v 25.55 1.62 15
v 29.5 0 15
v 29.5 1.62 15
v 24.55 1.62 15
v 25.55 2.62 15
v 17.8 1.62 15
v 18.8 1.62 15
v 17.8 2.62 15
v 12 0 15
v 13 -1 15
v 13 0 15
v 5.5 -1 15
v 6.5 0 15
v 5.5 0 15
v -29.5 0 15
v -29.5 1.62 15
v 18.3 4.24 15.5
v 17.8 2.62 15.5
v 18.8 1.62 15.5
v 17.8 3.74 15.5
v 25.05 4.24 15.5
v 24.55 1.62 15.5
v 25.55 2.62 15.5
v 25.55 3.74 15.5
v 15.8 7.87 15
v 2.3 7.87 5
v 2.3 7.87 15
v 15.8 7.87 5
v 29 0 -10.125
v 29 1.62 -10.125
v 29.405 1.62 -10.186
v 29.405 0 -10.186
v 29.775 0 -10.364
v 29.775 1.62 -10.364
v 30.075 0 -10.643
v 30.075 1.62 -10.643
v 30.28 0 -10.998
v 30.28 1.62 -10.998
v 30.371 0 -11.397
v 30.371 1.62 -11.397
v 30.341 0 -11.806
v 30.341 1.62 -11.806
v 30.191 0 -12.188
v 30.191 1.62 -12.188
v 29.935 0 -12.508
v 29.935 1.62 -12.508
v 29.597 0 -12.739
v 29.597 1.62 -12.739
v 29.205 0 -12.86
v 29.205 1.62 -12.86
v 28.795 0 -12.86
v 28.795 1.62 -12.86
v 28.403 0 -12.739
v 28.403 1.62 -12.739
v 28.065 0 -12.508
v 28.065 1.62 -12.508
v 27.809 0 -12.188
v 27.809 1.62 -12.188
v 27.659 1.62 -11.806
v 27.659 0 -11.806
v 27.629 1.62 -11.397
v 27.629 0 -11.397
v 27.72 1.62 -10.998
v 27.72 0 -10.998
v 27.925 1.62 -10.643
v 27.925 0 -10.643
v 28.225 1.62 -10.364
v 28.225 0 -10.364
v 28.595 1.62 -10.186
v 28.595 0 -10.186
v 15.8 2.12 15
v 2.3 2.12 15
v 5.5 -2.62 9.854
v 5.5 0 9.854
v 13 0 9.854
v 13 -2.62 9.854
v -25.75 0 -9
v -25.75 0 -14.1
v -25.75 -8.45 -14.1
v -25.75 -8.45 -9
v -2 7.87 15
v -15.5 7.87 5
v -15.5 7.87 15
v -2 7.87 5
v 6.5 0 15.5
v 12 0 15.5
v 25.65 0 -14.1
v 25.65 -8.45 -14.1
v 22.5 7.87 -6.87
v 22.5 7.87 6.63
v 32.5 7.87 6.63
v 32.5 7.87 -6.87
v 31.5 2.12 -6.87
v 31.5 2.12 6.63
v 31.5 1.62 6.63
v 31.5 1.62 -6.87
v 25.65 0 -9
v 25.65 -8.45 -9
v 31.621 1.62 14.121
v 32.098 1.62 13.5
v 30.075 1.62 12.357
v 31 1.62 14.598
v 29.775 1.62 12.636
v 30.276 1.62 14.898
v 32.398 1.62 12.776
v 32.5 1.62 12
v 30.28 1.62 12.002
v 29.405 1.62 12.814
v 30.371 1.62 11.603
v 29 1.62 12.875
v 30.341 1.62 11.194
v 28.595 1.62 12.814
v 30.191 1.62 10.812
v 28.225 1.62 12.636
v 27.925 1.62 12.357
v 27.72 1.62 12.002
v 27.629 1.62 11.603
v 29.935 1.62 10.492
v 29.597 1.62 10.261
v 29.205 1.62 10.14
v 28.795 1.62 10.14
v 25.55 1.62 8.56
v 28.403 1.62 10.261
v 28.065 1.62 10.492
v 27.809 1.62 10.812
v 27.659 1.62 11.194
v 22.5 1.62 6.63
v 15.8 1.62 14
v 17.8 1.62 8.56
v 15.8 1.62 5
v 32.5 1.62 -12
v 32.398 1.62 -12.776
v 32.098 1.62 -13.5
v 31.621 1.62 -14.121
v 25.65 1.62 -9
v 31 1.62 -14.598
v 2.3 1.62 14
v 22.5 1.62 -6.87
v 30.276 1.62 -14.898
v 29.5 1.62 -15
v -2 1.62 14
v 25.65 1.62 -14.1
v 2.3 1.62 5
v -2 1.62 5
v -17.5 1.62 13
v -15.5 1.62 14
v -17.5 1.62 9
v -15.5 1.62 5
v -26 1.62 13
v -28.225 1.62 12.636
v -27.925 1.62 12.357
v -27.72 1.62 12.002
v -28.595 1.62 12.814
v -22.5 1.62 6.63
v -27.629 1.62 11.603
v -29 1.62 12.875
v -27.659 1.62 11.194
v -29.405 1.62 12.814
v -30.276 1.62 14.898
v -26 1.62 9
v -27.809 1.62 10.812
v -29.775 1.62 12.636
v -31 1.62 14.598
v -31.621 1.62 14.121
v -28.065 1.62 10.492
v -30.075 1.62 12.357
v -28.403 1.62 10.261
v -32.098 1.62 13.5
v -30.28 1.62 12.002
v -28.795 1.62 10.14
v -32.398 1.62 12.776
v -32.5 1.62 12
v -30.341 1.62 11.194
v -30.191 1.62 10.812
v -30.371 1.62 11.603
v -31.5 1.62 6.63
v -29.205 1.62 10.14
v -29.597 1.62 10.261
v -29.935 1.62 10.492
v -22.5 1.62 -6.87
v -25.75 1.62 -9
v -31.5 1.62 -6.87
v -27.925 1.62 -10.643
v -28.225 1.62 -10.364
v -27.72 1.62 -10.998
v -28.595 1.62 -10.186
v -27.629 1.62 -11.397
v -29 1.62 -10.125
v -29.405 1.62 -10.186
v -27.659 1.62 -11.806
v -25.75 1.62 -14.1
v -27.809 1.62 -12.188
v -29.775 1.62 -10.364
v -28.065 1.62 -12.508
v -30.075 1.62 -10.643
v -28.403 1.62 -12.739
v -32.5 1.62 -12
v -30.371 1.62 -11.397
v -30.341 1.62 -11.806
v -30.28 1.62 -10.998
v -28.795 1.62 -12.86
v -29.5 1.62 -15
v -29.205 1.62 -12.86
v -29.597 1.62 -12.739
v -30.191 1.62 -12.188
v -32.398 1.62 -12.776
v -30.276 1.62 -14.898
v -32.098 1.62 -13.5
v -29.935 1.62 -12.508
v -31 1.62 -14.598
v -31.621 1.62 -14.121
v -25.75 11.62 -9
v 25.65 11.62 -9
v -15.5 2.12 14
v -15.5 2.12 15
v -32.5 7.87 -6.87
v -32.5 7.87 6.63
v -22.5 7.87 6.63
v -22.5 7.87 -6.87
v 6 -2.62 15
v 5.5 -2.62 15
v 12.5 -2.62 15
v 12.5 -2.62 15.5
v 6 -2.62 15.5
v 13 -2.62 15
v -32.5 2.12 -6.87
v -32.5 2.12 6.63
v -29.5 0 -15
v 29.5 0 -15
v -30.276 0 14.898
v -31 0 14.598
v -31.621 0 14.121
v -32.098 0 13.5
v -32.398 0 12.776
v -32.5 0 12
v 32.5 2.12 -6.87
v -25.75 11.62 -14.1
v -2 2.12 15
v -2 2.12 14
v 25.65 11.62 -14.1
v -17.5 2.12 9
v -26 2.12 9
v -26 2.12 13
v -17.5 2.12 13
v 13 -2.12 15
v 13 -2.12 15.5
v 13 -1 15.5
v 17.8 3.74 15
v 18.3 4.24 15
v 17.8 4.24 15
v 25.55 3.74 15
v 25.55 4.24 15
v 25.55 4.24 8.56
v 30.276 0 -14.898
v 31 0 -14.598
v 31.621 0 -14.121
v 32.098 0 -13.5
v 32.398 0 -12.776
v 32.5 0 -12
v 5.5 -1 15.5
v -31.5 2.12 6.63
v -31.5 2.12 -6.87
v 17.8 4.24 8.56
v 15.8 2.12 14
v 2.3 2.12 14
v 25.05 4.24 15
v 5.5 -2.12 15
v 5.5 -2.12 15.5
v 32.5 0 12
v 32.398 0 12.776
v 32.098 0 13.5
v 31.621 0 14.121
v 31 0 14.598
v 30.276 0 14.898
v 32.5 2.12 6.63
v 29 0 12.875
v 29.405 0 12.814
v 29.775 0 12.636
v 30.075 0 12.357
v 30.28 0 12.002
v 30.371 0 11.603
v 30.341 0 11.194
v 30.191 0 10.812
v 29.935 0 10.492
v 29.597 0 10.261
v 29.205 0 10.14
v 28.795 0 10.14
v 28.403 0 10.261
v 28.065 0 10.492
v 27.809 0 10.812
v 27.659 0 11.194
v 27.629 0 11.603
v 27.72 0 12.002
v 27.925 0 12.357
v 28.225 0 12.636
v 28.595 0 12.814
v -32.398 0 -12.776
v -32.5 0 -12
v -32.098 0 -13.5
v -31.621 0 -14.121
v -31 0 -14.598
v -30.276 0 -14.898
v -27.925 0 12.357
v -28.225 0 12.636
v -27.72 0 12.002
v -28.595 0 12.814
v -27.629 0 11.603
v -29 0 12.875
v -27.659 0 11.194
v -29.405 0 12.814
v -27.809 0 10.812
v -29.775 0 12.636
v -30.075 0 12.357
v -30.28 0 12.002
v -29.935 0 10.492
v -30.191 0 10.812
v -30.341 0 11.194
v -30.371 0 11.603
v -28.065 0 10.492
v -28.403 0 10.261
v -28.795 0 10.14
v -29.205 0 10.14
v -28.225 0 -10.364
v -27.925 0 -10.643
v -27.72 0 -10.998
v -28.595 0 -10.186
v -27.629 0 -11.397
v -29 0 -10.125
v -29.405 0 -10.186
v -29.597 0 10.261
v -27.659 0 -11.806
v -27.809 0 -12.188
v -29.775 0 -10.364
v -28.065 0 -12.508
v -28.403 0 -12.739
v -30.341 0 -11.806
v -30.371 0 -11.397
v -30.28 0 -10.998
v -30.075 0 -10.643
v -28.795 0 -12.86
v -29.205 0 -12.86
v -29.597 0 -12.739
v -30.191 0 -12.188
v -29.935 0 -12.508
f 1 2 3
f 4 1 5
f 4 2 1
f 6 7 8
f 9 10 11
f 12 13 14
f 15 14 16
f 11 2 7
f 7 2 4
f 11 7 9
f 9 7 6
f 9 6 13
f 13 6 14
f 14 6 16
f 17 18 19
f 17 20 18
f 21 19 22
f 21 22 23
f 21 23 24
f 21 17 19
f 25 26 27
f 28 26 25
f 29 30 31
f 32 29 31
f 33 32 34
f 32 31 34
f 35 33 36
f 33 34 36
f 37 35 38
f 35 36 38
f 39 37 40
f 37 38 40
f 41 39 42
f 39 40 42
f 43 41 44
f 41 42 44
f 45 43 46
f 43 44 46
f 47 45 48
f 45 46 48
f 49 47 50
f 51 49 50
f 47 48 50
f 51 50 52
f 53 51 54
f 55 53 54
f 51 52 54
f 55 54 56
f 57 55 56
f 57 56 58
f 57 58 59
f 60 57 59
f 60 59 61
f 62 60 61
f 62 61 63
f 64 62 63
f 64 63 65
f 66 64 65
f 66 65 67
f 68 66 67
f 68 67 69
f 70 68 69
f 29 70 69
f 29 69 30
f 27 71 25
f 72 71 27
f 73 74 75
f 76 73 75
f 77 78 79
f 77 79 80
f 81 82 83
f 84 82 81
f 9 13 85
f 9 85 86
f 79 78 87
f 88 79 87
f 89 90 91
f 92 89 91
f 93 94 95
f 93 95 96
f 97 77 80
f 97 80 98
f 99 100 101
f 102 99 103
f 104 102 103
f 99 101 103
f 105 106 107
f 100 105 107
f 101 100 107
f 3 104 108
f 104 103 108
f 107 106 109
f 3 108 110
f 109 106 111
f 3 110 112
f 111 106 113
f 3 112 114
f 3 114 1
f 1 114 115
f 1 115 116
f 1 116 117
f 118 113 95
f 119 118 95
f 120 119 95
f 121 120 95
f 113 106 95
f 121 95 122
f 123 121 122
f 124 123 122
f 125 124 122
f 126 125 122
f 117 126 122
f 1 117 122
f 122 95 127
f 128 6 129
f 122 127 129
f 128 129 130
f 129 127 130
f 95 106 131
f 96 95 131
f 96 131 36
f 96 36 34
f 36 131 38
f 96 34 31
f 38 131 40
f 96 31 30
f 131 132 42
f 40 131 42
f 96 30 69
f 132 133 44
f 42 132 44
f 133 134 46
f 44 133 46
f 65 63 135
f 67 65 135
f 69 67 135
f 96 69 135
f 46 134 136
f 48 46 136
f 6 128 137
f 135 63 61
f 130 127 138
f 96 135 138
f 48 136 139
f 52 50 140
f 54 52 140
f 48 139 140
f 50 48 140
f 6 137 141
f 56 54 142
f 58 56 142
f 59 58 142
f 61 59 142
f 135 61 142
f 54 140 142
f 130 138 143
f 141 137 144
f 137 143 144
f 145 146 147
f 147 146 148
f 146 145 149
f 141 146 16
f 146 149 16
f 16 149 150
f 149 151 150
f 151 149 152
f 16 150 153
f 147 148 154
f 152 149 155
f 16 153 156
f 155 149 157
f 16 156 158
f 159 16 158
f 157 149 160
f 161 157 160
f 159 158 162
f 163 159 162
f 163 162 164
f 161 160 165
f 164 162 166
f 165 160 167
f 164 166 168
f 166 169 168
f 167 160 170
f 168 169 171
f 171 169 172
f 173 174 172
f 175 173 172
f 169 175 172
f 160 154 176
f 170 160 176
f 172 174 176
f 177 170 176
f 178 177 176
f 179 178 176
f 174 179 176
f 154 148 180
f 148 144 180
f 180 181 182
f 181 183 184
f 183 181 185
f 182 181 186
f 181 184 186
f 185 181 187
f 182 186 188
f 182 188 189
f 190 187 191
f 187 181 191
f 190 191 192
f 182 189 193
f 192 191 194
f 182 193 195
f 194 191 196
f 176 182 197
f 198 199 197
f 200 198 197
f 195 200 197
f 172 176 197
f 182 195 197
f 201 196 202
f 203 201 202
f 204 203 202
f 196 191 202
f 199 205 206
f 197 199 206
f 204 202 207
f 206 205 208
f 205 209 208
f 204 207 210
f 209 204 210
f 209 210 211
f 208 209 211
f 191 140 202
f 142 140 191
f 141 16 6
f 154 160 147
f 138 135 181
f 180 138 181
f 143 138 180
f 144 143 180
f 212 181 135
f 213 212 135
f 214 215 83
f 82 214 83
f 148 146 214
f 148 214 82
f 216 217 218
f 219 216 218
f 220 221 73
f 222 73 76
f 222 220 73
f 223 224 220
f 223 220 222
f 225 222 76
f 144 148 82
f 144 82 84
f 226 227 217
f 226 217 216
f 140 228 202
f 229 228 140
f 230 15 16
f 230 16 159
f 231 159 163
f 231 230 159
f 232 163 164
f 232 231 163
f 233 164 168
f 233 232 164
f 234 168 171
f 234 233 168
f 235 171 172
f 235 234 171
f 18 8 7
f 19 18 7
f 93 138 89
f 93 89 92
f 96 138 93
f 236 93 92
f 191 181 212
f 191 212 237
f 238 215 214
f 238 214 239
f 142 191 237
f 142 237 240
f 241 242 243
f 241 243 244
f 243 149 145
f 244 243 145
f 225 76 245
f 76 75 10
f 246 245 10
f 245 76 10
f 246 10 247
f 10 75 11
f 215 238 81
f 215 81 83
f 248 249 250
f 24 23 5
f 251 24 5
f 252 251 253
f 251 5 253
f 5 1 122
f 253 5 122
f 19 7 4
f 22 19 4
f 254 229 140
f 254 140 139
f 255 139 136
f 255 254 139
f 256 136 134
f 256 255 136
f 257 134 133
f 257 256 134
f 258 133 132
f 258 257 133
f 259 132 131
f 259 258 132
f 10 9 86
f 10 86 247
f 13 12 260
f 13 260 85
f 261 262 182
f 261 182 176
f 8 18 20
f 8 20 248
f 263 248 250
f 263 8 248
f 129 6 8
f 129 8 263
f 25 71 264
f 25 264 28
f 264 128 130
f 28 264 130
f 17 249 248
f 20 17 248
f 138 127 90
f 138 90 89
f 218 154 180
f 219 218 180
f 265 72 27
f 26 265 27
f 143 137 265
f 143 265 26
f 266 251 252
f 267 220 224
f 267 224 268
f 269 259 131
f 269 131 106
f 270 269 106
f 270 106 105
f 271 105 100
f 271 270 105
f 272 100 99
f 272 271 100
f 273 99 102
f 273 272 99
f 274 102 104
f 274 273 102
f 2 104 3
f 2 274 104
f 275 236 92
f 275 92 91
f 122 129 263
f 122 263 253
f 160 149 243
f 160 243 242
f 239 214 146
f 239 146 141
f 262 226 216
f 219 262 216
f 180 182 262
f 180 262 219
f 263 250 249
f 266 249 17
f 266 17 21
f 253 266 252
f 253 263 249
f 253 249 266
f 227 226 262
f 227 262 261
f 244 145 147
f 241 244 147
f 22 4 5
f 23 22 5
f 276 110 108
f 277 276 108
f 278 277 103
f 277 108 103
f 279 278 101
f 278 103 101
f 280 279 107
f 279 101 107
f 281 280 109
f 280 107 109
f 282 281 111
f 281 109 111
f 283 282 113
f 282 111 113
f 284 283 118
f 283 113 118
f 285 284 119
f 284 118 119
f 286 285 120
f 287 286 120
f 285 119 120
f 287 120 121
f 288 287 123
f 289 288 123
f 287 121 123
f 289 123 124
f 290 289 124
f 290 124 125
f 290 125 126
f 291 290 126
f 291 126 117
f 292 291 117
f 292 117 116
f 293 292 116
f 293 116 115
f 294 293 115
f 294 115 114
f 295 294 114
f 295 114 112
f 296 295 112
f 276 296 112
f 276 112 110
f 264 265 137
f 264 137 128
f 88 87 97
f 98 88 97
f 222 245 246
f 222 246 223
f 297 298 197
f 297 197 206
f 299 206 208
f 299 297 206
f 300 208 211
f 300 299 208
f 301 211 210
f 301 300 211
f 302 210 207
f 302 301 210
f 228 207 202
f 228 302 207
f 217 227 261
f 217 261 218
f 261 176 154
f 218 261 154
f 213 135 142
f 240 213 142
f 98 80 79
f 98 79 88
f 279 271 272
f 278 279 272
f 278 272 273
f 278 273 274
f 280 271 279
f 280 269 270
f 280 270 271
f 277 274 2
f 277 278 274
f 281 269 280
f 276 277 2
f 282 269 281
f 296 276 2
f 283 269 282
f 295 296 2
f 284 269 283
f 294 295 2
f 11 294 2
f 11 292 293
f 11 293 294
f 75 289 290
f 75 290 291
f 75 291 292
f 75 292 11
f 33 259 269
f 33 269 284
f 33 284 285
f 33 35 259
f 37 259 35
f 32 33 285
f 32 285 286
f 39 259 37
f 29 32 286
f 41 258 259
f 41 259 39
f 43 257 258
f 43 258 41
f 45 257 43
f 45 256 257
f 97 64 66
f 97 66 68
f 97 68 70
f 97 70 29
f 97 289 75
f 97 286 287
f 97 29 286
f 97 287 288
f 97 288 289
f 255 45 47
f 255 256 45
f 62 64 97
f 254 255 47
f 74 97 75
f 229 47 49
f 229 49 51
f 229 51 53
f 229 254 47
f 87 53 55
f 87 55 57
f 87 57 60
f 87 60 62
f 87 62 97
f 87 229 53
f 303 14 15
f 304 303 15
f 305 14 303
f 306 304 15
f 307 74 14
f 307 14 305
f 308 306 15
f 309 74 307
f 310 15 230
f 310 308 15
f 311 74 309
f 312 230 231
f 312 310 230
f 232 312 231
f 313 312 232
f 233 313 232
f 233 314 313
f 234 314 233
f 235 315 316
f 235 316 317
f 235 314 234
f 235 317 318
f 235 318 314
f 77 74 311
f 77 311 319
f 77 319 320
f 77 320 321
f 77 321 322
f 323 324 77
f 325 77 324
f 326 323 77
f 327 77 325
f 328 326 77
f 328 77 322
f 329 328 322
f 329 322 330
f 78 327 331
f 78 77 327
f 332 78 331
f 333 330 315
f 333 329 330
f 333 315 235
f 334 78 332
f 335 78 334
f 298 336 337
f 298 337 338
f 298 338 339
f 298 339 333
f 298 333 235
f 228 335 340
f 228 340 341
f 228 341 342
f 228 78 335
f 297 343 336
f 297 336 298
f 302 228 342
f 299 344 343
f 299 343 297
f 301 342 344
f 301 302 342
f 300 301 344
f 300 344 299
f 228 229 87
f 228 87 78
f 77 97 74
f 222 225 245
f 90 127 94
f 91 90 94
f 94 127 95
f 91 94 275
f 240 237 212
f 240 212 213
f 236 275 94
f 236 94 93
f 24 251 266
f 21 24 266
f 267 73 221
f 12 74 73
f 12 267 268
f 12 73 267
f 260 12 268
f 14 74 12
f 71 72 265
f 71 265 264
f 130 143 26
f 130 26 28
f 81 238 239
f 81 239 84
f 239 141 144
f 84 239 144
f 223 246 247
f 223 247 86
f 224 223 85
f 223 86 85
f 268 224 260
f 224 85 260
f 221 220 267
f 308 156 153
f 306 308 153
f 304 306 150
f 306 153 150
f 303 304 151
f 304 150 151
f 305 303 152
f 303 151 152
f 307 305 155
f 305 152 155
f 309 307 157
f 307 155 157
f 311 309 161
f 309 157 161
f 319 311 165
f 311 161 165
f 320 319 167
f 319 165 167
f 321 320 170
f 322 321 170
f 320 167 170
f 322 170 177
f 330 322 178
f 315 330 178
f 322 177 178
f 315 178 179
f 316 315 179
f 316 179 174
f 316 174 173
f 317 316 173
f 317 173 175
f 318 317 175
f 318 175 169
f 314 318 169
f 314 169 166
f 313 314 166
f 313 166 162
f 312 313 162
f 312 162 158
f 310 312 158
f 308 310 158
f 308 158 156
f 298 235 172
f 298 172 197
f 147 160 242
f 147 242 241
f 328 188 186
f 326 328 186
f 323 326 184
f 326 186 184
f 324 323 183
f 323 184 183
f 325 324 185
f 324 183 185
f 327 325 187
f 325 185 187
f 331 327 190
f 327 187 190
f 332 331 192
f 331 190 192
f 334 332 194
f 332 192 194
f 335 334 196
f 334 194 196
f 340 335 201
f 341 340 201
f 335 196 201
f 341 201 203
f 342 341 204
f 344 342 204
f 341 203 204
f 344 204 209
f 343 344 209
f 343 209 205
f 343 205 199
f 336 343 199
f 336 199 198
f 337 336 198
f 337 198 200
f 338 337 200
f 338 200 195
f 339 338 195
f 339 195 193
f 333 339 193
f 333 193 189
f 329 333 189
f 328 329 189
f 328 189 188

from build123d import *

# Parameters (mm, degrees)
EXTRUDE_1_DEPTH     = 1.62
CUT_EXTRUDE_1_REACH = 3.62
SKETCH_2_R          = 1.375
SKETCH_11_W         = 51.4
SKETCH_11_H         = 5.1
EXTRUDE_9_DEPTH     = 8.45
SKETCH_12_W         = 51.4
SKETCH_12_H         = 5.1
EXTRUDE_10_DEPTH    = 10
SKETCH_13_W         = 10
SKETCH_13_H         = 13.5
SKETCH_13_W_2       = 13.5
SKETCH_13_H_2       = 10
EXTRUDE_12_DEPTH    = 6.25
SKETCH_14_W         = 13.5
SKETCH_14_H         = 0.5
CUT_EXTRUDE_2_DEPTH = 1
SKETCH_15_W         = 13.5
SKETCH_15_H         = 0.5
CUT_EXTRUDE_3_DEPTH = 1
SKETCH_16_W         = 13.5
SKETCH_16_H         = 0.5
CUT_EXTRUDE_4_DEPTH = 1
SKETCH_17_W         = 7.75
SKETCH_17_H         = 6.44
EXTRUDE_13_DEPTH    = 2.62
EXTRUDE_14_DEPTH    = 0.5
SKETCH_19_W         = 8.5
SKETCH_19_H         = 4
EXTRUDE_15_DEPTH    = 0.5
SKETCH_20_W         = 7.5
SKETCH_20_H         = 5.146384945
EXTRUDE_16_DEPTH    = 2.62
EXTRUDE_17_DEPTH    = 0.5


with BuildPart() as part:
    # 草图1 → 凸台-拉伸1 (new body)
    with BuildSketch(Plane(origin=(0, 0, 0), x_dir=(1, 0, 0), z_dir=(0, 1, 0))):
        with BuildLine():
            Line((-29.5, 15), (29.5, 15))
            ThreePointArc((29.5, 15), (31.621320344, 14.121320344), (32.5, 12))
            Line((32.5, 12), (32.5, -12))
            ThreePointArc((32.5, -12), (31.621320344, -14.121320344), (29.5, -15))
            Line((29.5, -15), (-29.5, -15))
            ThreePointArc((-29.5, -15), (-31.621320344, -14.121320344), (-32.5, -12))
            Line((-32.5, -12), (-32.5, 12))
            ThreePointArc((-32.5, 12), (-31.621320344, 14.121320344), (-29.5, 15))
        make_face()
    extrude(amount=EXTRUDE_1_DEPTH)

    # 草图2 → 切除-拉伸1 (cut, up to next)
    with BuildSketch(Plane(origin=(0, 1.62, 0), x_dir=(1, 0, 0), z_dir=(0, 1, 0)), mode=Mode.PRIVATE) as cut_extrude_1_sk1:
        with Locations(Location((29, -11.5, 0), (0, 0, 270))):  # turned: the seam where the file's is
            Circle(SKETCH_2_R)
    cut_extrude_1_tool1 = extrude(cut_extrude_1_sk1.sketch, amount=-CUT_EXTRUDE_1_REACH, mode=Mode.PRIVATE) & part.part
    add(cut_extrude_1_tool1.solids().sort_by_distance((29, 1.62, 11.5))[0], mode=Mode.SUBTRACT)
    # 草图2 → 切除-拉伸1 (cut, up to next)
    with BuildSketch(Plane(origin=(0, 1.62, 0), x_dir=(1, 0, 0), z_dir=(0, 1, 0)), mode=Mode.PRIVATE) as cut_extrude_1_sk2:
        with Locations(Location((29, 11.5, 0), (0, 0, 270))):  # turned: the seam where the file's is
            Circle(SKETCH_2_R)
    cut_extrude_1_tool2 = extrude(cut_extrude_1_sk2.sketch, amount=-CUT_EXTRUDE_1_REACH, mode=Mode.PRIVATE) & part.part
    add(cut_extrude_1_tool2.solids().sort_by_distance((29, 1.62, -11.5))[0], mode=Mode.SUBTRACT)
    # 草图2 → 切除-拉伸1 (cut, up to next)
    with BuildSketch(Plane(origin=(0, 1.62, 0), x_dir=(1, 0, 0), z_dir=(0, 1, 0)), mode=Mode.PRIVATE) as cut_extrude_1_sk3:
        with Locations(Location((-29, -11.5, 0), (0, 0, 270))):  # turned: the seam where the file's is
            Circle(SKETCH_2_R)
    cut_extrude_1_tool3 = extrude(cut_extrude_1_sk3.sketch, amount=-CUT_EXTRUDE_1_REACH, mode=Mode.PRIVATE) & part.part
    add(cut_extrude_1_tool3.solids().sort_by_distance((-29, 1.62, 11.5))[0], mode=Mode.SUBTRACT)
    # 草图2 → 切除-拉伸1 (cut, up to next)
    with BuildSketch(Plane(origin=(0, 1.62, 0), x_dir=(1, 0, 0), z_dir=(0, 1, 0)), mode=Mode.PRIVATE) as cut_extrude_1_sk4:
        with Locations(Location((-29, 11.5, 0), (0, 0, 270))):  # turned: the seam where the file's is
            Circle(SKETCH_2_R)
    cut_extrude_1_tool4 = extrude(cut_extrude_1_sk4.sketch, amount=-CUT_EXTRUDE_1_REACH, mode=Mode.PRIVATE) & part.part
    add(cut_extrude_1_tool4.solids().sort_by_distance((-29, 1.62, -11.5))[0], mode=Mode.SUBTRACT)

    # 草图11 → 凸台-拉伸9 (add)
    with BuildSketch(Plane.XZ):
        with Locations((-0.05, -11.55)):
            Rectangle(SKETCH_11_W, SKETCH_11_H)
    extrude(amount=EXTRUDE_9_DEPTH)

    # 草图12 → 凸台-拉伸10 (add)
    with BuildSketch(Plane(origin=(0, 1.62, 0), x_dir=(1, 0, 0), z_dir=(0, 1, 0))):
        with Locations((-0.05, 11.55)):
            Rectangle(SKETCH_12_W, SKETCH_12_H)
    extrude(amount=EXTRUDE_10_DEPTH)

    # 草图13 → 凸台-拉伸12 (add)
    with BuildSketch(Plane(origin=(0, 1.62, 0), x_dir=(1, 0, 0), z_dir=(0, 1, 0))):
        with Locations((-27.5, 0.12)):
            Rectangle(SKETCH_13_W, SKETCH_13_H)
        with Locations((27.5, 0.12)):
            Rectangle(SKETCH_13_W, SKETCH_13_H)
        with Locations((-8.75, -10)):
            Rectangle(SKETCH_13_W_2, SKETCH_13_H_2)
        with Locations((9.05, -10)):
            Rectangle(SKETCH_13_W_2, SKETCH_13_H_2)
    extrude(amount=EXTRUDE_12_DEPTH)

    # 草图14 → 切除-拉伸2 (cut)
    with BuildSketch(Plane.XY.offset(15)):
        with Locations((-8.75, 1.87)):
            Rectangle(SKETCH_14_W, SKETCH_14_H)
        with Locations((9.05, 1.87)):
            Rectangle(SKETCH_14_W, SKETCH_14_H)
    extrude(amount=-CUT_EXTRUDE_2_DEPTH, mode=Mode.SUBTRACT)

    # 草图15 → 切除-拉伸3 (cut)
    with BuildSketch(Plane.ZY.offset(32.5)):
        with Locations((-0.12, 1.87)):
            Rectangle(SKETCH_15_W, SKETCH_15_H)
    extrude(amount=-CUT_EXTRUDE_3_DEPTH, mode=Mode.SUBTRACT)

    # 草图16 → 切除-拉伸4 (cut)
    with BuildSketch(Plane(origin=(32.5, 0, 0), x_dir=(0, 0, -1), z_dir=(1, 0, 0))):
        with Locations((0.12, 1.87)):
            Rectangle(SKETCH_16_W, SKETCH_16_H)
    extrude(amount=-CUT_EXTRUDE_4_DEPTH, mode=Mode.SUBTRACT)

    # 草图17 → 凸台-拉伸13 (add)
    with BuildSketch(Plane(origin=(0, 1.62, 0), x_dir=(1, 0, 0), z_dir=(0, 1, 0))):
        with Locations((21.675, -11.78)):
            Rectangle(SKETCH_17_W, SKETCH_17_H)
    extrude(amount=EXTRUDE_13_DEPTH)

    # 草图18 → 凸台-拉伸14 (add)
    with BuildSketch(Plane.XY.offset(15)):
        Polygon((17.8, 2.62), (18.8, 1.62), (24.55, 1.62), (25.55, 2.62), (25.55, 3.74), (25.05, 4.24), (18.3, 4.24), (17.8, 3.74), align=None)
    extrude(amount=EXTRUDE_14_DEPTH)

    # 草图19 → 凸台-拉伸15 (add)
    with BuildSketch(Plane(origin=(0, 1.62, 0), x_dir=(1, 0, 0), z_dir=(0, 1, 0))):
        with Locations((-21.75, -11)):
            Rectangle(SKETCH_19_W, SKETCH_19_H)
    extrude(amount=EXTRUDE_15_DEPTH)

    # 草图20 → 凸台-拉伸16 (add)
    with BuildSketch(Plane.XZ):
        with Locations((9.25, 12.426807528)):
            Rectangle(SKETCH_20_W, SKETCH_20_H)
    extrude(amount=EXTRUDE_16_DEPTH)

    # 草图21 → 凸台-拉伸17 (add)
    with BuildSketch(Plane.XY.offset(15)):
        Polygon((6.5, 0), (12, 0), (13, -1), (13, -2.12), (12.5, -2.62), (6, -2.62), (5.5, -2.12), (5.5, -1), align=None)
    extrude(amount=EXTRUDE_17_DEPTH)


solid = part.part
